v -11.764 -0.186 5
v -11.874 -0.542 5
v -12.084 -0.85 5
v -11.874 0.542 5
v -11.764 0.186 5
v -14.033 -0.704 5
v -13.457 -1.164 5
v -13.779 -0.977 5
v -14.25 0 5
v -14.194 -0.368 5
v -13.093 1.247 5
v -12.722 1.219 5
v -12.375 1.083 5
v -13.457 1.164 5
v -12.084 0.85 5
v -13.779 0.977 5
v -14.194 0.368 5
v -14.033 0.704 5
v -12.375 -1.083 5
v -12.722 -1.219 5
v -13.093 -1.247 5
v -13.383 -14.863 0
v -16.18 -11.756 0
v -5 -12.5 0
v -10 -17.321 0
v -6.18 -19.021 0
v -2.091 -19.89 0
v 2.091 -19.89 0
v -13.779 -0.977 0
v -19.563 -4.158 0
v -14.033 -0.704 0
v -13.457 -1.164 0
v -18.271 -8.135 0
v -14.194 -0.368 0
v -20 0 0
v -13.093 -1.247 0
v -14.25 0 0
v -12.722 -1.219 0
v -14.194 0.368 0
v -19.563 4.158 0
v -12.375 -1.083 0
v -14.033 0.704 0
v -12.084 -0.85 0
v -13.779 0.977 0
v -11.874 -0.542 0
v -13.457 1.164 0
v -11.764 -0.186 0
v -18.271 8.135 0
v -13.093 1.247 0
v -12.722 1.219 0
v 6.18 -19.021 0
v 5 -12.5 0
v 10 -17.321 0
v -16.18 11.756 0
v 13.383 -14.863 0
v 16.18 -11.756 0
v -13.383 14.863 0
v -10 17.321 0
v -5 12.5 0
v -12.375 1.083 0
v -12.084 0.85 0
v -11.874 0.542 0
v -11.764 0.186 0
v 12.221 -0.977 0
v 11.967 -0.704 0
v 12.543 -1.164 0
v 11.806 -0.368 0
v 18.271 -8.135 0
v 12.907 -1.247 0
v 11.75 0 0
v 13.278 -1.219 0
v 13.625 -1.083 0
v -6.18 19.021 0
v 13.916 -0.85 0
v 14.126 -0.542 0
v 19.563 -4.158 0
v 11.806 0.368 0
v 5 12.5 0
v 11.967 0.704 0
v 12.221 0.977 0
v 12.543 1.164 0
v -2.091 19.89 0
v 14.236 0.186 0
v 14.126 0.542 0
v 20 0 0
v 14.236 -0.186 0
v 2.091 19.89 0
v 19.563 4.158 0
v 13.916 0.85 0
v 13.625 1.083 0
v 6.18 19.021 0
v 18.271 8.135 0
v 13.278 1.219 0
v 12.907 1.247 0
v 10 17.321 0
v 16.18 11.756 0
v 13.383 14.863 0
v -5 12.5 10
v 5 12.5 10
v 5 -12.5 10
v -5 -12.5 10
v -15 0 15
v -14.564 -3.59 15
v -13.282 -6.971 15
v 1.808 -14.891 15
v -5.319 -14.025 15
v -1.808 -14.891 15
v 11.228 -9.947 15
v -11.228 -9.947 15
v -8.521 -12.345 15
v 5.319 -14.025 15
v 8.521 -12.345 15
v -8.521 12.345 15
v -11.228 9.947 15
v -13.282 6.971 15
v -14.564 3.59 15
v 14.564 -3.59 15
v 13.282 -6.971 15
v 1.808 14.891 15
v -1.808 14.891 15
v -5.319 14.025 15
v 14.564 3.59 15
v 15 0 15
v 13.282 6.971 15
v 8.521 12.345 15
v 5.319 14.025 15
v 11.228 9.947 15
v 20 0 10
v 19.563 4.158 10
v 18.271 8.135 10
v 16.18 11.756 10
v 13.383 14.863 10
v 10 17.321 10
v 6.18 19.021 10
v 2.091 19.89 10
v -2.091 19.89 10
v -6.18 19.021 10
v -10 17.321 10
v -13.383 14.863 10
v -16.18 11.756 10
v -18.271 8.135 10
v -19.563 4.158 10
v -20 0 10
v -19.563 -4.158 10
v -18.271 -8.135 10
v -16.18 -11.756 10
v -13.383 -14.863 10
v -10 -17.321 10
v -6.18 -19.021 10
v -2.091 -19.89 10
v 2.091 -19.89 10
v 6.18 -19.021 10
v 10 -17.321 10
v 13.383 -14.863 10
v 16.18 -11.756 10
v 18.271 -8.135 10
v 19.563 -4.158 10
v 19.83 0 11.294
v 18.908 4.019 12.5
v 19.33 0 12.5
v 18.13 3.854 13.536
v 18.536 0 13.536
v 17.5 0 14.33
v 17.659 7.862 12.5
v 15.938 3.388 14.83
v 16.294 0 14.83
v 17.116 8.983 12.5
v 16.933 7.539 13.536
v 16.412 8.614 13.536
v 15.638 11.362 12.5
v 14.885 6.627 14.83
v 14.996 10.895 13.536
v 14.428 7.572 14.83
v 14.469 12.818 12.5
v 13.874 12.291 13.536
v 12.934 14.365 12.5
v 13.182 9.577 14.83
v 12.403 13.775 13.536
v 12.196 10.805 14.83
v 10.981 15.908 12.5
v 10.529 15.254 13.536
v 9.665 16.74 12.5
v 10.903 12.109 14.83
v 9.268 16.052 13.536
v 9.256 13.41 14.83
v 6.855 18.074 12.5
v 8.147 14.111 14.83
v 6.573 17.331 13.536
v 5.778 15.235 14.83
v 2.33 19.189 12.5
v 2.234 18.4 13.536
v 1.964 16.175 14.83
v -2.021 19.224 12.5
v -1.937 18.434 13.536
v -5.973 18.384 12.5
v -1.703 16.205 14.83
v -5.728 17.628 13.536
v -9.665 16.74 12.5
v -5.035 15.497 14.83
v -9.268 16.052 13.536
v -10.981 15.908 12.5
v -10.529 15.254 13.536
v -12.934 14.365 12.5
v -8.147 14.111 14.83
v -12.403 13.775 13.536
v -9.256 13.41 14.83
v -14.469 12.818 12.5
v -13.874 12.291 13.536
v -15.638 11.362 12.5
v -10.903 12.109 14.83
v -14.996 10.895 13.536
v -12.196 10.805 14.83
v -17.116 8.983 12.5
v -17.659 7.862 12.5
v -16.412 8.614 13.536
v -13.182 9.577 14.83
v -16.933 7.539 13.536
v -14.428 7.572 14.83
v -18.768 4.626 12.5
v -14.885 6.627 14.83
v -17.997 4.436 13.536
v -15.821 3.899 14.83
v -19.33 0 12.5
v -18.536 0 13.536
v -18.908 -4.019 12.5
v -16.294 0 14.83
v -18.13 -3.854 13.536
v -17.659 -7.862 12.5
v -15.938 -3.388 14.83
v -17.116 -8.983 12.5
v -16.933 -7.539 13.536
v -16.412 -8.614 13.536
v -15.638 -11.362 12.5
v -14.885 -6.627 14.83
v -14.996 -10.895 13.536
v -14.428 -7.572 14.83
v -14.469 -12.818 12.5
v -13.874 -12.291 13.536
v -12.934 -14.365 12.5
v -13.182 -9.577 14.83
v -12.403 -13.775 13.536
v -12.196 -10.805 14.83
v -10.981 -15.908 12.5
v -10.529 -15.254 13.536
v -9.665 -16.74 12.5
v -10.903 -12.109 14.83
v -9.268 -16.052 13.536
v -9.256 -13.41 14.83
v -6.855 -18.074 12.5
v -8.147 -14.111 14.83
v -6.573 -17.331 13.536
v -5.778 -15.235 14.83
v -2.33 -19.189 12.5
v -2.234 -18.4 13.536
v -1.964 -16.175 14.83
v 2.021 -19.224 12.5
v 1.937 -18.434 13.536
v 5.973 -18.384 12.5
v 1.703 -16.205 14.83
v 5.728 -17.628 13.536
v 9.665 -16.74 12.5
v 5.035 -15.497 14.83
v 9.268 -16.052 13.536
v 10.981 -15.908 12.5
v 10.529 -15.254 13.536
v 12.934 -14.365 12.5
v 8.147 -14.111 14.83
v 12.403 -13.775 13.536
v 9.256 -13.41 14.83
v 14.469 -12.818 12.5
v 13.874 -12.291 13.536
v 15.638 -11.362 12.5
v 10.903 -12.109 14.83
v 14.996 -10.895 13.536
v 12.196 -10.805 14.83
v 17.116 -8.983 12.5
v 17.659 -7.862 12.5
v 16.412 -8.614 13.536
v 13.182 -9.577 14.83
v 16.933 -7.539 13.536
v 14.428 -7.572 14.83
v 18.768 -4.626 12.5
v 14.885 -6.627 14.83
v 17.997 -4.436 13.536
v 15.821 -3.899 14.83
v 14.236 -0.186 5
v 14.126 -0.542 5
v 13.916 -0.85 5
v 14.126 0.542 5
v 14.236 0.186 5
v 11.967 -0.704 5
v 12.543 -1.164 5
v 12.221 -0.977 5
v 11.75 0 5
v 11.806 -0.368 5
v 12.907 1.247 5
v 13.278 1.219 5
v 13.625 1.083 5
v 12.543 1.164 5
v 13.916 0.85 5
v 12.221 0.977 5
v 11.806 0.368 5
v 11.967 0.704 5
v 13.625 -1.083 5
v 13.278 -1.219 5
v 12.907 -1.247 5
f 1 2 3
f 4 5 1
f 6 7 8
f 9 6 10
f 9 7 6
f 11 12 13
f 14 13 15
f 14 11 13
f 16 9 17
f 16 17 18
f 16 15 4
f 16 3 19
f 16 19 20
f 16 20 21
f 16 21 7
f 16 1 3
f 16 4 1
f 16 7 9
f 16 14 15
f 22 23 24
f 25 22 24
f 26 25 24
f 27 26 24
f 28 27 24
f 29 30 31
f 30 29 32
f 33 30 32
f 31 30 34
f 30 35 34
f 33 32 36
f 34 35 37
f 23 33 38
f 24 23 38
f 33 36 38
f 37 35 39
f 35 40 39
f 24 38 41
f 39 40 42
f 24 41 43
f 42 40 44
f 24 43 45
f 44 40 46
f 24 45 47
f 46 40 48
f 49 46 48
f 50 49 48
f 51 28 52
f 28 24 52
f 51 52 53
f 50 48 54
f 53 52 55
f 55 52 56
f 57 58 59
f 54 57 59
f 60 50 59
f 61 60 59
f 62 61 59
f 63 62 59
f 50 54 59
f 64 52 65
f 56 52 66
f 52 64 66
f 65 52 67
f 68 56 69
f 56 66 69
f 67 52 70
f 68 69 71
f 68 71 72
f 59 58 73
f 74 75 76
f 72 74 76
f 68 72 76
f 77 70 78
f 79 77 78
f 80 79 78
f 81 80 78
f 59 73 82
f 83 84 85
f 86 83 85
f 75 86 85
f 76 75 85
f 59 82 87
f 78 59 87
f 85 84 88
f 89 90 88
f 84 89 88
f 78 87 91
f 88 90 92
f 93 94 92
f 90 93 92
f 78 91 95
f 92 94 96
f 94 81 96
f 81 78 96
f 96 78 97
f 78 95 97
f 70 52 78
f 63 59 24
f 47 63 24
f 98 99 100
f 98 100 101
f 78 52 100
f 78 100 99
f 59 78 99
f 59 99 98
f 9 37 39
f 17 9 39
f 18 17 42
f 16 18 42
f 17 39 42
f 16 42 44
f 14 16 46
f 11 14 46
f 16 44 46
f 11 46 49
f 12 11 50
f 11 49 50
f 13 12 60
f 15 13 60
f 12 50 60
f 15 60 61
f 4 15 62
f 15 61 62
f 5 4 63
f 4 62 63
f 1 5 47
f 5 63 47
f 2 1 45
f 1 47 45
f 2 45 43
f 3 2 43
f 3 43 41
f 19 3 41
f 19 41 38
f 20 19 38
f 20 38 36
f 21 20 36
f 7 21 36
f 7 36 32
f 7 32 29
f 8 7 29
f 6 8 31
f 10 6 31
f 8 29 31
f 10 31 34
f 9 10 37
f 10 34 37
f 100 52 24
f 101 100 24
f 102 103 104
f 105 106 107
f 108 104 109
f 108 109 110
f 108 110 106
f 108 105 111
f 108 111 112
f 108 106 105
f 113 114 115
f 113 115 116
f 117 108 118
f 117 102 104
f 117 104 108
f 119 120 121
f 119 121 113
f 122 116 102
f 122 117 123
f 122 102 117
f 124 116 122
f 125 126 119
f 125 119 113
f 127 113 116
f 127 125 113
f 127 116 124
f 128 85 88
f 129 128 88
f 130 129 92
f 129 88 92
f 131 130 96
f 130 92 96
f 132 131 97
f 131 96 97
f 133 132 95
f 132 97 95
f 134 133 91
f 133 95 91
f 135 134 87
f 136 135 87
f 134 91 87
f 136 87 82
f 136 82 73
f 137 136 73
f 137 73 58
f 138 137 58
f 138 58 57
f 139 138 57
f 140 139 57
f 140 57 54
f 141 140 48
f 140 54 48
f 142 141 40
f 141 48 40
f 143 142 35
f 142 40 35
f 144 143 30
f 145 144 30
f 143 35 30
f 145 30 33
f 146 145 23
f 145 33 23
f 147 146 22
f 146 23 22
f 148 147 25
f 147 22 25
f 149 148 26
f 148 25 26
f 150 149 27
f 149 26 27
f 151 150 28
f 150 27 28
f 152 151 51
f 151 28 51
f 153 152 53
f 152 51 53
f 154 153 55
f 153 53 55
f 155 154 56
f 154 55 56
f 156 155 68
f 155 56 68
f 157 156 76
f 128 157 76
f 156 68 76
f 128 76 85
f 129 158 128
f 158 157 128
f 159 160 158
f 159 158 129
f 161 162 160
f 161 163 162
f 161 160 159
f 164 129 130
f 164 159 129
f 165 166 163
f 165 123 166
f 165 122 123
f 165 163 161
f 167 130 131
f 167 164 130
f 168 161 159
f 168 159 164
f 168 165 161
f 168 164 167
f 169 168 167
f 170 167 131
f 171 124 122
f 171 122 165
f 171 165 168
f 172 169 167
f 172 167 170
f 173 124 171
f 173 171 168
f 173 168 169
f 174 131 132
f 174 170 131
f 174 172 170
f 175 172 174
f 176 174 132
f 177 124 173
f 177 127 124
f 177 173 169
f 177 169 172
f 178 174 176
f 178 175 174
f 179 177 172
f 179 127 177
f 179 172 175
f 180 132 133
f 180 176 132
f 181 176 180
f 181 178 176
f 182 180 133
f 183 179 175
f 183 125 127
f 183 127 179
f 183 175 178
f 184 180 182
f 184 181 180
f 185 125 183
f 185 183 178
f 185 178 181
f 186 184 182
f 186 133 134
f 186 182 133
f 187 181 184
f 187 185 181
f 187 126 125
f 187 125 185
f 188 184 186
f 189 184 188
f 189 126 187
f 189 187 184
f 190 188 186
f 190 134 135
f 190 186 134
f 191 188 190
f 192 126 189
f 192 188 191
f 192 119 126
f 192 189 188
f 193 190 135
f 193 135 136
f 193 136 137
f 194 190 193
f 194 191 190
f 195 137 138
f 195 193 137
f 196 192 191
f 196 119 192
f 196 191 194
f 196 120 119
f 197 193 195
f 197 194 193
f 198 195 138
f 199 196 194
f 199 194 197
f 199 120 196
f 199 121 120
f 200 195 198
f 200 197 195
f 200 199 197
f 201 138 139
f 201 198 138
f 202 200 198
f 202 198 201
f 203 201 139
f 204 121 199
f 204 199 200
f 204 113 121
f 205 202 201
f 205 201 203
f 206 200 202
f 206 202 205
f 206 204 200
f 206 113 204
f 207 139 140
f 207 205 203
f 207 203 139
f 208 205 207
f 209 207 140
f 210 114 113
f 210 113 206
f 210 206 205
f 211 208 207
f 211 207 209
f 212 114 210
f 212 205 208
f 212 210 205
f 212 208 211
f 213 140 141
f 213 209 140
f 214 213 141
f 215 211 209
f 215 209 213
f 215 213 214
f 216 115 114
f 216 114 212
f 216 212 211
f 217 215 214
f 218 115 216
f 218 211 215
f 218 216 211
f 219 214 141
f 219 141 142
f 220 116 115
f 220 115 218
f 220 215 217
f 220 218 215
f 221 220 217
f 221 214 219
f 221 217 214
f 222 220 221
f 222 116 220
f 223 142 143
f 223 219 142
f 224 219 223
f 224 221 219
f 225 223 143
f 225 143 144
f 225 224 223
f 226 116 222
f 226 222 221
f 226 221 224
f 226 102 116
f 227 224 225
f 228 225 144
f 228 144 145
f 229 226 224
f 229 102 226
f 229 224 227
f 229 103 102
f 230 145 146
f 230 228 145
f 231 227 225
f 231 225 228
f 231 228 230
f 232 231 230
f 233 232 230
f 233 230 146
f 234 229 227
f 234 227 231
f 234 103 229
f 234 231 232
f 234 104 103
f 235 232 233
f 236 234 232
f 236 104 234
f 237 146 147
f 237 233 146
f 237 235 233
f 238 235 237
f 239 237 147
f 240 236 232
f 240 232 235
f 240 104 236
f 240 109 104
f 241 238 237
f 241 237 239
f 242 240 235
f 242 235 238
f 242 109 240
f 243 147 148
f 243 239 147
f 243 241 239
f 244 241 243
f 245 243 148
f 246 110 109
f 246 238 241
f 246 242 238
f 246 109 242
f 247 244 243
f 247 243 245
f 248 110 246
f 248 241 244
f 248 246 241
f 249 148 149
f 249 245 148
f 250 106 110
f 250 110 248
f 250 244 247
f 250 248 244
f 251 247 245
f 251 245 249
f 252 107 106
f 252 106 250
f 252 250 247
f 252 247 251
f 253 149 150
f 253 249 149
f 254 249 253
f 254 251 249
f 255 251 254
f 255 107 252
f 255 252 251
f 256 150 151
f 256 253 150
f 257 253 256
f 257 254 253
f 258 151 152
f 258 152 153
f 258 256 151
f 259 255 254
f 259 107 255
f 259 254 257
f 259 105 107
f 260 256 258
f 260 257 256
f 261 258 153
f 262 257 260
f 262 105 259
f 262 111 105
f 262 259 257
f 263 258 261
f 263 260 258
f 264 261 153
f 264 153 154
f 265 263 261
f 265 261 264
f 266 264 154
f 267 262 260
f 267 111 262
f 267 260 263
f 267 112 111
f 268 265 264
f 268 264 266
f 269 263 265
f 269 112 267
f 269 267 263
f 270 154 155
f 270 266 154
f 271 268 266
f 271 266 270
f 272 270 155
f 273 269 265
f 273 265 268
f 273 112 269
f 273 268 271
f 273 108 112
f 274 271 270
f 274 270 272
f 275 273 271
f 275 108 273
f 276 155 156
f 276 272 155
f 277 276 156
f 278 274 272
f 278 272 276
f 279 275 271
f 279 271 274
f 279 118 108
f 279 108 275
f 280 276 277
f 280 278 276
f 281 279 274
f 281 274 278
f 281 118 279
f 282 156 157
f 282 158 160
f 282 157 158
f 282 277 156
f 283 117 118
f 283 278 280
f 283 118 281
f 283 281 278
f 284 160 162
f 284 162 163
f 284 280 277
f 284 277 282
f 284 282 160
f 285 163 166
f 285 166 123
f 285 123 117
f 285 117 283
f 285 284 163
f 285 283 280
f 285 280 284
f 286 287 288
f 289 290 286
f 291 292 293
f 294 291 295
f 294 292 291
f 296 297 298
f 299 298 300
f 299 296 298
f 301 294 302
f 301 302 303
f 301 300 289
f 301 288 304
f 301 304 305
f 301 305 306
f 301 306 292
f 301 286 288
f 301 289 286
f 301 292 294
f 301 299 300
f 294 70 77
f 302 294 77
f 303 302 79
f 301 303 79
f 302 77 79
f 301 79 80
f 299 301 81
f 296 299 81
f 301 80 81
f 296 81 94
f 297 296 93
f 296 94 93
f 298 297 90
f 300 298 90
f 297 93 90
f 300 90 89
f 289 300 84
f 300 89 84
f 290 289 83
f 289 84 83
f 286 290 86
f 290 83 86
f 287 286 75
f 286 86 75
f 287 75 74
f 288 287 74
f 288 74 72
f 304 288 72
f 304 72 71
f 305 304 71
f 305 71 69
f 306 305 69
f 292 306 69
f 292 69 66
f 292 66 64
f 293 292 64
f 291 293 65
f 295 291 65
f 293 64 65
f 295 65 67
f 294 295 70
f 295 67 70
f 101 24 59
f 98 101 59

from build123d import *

# Parameters (mm, degrees)
SKIZZE1_R                       = 20
AUFSATZ_LINEAR_AUSTRAGEN1_DEPTH = 15
VERRUNDUNG1_R                   = 5
SKIZZE2_W                       = 10
SKIZZE2_H                       = 25
SCHNITT_LINEAR_AUSTRAGEN1_DEPTH = 10
SKIZZE3_R                       = 1.25
SCHNITT_LINEAR_AUSTRAGEN2_DEPTH = 5


with BuildPart() as part:
    # Skizze1 → Aufsatz-Linear austragen1 (new body)
    with BuildSketch(Plane.XY):
        Circle(SKIZZE1_R)
    extrude(amount=AUFSATZ_LINEAR_AUSTRAGEN1_DEPTH)

    # Verrundung1
    verrundung1_edges = [part.edges().sort_by_distance(p)[0] for p in [
        (-20, 0, 15),
    ]]
    fillet(verrundung1_edges, radius=VERRUNDUNG1_R)

    # Skizze2 → Schnitt-Linear austragen1 (cut)
    with BuildSketch(Plane(origin=(0, 0, 0), x_dir=(-1, 0, 0), z_dir=(0, 0, -1))):
        Rectangle(SKIZZE2_W, SKIZZE2_H)
    extrude(amount=-SCHNITT_LINEAR_AUSTRAGEN1_DEPTH, mode=Mode.SUBTRACT)

    # Skizze3 → Schnitt-Linear austragen2 (cut)
    with BuildSketch(Plane(origin=(0, 0, 0), x_dir=(-1, 0, 0), z_dir=(0, 0, -1))):
        with Locations((-13, 0)):
            Circle(SKIZZE3_R)
        with Locations((13, 0)):
            Circle(SKIZZE3_R)
    extrude(amount=-SCHNITT_LINEAR_AUSTRAGEN2_DEPTH, mode=Mode.SUBTRACT)


solid = part.part
